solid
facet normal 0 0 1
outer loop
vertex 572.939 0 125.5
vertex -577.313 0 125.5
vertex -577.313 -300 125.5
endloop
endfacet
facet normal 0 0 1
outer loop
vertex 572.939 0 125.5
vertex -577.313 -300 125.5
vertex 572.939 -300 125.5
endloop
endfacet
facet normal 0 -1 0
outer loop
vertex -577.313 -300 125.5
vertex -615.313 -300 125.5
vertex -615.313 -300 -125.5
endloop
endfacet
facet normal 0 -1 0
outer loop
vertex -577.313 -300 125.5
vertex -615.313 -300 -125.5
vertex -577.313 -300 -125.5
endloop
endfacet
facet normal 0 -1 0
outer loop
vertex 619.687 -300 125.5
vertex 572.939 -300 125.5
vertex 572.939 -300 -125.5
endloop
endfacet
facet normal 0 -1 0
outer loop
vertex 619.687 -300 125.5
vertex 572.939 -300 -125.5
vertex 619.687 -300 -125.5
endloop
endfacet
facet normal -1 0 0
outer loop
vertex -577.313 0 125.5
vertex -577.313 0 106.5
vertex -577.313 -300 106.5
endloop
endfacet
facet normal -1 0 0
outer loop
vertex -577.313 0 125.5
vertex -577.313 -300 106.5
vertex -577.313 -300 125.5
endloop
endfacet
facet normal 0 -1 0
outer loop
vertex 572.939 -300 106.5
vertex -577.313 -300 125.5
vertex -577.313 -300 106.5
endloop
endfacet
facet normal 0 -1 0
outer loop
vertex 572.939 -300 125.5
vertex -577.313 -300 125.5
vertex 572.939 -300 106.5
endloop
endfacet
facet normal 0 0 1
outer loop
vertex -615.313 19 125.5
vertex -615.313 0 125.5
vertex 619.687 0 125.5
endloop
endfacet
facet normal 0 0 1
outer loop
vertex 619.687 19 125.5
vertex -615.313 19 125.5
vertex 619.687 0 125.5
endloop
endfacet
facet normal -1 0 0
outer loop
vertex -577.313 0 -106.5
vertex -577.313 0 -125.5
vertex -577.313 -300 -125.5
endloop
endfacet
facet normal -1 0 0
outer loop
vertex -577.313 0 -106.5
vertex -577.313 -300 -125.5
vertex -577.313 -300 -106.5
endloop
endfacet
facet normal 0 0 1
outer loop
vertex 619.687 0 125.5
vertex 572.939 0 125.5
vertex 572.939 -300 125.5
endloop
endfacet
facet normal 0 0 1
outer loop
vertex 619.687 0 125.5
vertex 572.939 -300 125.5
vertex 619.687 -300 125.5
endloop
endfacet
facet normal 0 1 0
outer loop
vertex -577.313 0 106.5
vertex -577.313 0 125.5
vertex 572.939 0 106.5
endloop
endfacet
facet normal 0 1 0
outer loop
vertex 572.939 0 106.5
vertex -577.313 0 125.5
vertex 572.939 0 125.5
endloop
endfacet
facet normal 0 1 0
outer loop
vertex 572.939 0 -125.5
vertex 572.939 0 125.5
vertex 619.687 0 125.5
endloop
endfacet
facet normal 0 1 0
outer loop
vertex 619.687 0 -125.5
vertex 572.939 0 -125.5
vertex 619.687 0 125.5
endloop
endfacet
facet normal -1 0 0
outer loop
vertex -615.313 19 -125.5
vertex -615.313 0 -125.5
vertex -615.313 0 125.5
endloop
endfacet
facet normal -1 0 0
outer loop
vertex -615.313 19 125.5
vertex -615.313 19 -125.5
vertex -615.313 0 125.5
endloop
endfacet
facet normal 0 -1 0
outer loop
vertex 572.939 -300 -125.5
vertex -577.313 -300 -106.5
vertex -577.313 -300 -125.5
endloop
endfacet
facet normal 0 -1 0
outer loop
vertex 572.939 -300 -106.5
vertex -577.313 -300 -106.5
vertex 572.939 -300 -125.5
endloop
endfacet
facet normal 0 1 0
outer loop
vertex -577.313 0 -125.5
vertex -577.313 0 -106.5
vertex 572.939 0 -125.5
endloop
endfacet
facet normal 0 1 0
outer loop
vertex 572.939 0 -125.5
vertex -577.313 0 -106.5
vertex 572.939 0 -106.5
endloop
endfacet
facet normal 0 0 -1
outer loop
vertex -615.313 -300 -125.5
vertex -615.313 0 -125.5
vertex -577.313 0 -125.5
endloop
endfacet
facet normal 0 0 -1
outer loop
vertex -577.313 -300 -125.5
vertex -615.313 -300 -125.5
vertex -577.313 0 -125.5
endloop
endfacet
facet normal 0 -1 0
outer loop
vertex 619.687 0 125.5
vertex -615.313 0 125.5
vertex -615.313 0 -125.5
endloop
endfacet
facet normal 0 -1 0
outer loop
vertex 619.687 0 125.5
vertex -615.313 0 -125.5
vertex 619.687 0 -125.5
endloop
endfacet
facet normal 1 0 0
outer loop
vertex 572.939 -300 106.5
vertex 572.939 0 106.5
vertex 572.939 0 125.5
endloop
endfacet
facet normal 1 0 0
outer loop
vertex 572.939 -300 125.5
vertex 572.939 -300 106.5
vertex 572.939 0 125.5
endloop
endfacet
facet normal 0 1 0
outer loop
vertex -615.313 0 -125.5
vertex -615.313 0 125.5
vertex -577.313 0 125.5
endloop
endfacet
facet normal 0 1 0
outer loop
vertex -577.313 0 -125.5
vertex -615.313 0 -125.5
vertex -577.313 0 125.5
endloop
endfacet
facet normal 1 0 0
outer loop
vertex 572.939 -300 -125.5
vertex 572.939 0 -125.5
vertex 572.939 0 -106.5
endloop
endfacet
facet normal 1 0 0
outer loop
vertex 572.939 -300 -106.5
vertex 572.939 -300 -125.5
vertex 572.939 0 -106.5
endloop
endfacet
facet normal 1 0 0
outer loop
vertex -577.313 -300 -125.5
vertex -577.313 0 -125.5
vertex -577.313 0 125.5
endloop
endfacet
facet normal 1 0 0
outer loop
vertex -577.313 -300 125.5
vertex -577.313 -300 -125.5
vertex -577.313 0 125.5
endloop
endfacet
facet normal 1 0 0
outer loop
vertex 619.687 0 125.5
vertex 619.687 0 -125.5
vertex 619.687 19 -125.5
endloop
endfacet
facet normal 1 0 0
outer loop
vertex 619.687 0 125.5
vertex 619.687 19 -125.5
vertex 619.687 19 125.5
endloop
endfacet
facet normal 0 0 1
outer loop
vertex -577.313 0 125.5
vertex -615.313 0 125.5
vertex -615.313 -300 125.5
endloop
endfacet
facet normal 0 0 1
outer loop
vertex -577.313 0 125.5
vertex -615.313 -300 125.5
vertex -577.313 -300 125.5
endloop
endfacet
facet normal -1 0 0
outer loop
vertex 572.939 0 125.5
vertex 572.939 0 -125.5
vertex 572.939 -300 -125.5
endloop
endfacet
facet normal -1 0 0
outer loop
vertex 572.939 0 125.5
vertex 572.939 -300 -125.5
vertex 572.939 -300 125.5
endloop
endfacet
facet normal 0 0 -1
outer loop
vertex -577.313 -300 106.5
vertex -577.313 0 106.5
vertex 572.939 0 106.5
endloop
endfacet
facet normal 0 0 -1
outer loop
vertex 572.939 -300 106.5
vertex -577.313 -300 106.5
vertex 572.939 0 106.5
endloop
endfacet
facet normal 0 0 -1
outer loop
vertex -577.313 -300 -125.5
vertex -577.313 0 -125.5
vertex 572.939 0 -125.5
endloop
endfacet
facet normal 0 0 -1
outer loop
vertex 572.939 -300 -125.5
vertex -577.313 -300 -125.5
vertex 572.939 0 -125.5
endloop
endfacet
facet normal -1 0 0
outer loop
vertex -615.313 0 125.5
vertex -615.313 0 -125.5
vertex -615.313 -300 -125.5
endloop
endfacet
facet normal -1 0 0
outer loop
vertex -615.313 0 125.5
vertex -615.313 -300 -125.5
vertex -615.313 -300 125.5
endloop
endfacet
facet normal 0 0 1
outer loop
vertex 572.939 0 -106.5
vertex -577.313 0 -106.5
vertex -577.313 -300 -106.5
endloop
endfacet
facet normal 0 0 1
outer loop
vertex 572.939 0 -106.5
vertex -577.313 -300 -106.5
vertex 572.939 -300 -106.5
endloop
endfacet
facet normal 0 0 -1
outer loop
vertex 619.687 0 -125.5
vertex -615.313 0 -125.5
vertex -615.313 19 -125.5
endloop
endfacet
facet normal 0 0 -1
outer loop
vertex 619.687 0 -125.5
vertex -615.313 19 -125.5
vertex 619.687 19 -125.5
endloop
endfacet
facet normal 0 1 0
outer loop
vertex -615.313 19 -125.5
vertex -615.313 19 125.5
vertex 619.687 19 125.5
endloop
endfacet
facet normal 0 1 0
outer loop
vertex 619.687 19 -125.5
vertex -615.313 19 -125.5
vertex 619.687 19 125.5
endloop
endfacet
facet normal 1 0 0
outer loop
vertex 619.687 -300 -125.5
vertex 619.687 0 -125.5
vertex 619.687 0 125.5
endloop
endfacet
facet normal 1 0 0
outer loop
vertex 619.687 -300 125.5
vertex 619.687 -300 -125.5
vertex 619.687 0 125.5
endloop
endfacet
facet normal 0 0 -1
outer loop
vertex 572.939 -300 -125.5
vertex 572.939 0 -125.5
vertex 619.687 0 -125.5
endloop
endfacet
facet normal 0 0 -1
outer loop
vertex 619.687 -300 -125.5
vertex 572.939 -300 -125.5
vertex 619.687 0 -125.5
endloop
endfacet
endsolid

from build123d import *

# Parameters (mm, degrees)
F1_W     = 38
F1_H     = 251
F1_W_2   = 46.748253
F2_DEPTH = 300
F3_W     = 1150.251747
F3_H     = 19
F4_DEPTH = 300
F5_W     = 1235
F5_H     = 251
F6_DEPTH = 19


with BuildPart() as f2:
    # F1 (on Front) → F2 (new body)
    with BuildSketch(Plane.XZ):
        with Locations((-596.312937, 0)):
            Rectangle(F1_W, F1_H)
        with Locations((596.312936, 0)):
            Rectangle(F1_W_2, F1_H)
    extrude(amount=F2_DEPTH)


with BuildPart() as f4:
    # F3 (on Front) → F4 (new body, through all)
    with BuildSketch(Plane.XZ):
        with Locations((-2.187063, 116)):
            Rectangle(F3_W, F3_H)
        with Locations((-2.187063, -116)):
            Rectangle(F3_W, F3_H)
    extrude(amount=F4_DEPTH)


with BuildPart() as f6:
    # F5 (on face) → F6 (new body)
    with BuildSketch(Plane.XZ):
        with Locations((2.187063, 0)):
            Rectangle(F5_W, F5_H)
    extrude(amount=-F6_DEPTH)


solid = Compound([f2.part, f4.part, f6.part])
